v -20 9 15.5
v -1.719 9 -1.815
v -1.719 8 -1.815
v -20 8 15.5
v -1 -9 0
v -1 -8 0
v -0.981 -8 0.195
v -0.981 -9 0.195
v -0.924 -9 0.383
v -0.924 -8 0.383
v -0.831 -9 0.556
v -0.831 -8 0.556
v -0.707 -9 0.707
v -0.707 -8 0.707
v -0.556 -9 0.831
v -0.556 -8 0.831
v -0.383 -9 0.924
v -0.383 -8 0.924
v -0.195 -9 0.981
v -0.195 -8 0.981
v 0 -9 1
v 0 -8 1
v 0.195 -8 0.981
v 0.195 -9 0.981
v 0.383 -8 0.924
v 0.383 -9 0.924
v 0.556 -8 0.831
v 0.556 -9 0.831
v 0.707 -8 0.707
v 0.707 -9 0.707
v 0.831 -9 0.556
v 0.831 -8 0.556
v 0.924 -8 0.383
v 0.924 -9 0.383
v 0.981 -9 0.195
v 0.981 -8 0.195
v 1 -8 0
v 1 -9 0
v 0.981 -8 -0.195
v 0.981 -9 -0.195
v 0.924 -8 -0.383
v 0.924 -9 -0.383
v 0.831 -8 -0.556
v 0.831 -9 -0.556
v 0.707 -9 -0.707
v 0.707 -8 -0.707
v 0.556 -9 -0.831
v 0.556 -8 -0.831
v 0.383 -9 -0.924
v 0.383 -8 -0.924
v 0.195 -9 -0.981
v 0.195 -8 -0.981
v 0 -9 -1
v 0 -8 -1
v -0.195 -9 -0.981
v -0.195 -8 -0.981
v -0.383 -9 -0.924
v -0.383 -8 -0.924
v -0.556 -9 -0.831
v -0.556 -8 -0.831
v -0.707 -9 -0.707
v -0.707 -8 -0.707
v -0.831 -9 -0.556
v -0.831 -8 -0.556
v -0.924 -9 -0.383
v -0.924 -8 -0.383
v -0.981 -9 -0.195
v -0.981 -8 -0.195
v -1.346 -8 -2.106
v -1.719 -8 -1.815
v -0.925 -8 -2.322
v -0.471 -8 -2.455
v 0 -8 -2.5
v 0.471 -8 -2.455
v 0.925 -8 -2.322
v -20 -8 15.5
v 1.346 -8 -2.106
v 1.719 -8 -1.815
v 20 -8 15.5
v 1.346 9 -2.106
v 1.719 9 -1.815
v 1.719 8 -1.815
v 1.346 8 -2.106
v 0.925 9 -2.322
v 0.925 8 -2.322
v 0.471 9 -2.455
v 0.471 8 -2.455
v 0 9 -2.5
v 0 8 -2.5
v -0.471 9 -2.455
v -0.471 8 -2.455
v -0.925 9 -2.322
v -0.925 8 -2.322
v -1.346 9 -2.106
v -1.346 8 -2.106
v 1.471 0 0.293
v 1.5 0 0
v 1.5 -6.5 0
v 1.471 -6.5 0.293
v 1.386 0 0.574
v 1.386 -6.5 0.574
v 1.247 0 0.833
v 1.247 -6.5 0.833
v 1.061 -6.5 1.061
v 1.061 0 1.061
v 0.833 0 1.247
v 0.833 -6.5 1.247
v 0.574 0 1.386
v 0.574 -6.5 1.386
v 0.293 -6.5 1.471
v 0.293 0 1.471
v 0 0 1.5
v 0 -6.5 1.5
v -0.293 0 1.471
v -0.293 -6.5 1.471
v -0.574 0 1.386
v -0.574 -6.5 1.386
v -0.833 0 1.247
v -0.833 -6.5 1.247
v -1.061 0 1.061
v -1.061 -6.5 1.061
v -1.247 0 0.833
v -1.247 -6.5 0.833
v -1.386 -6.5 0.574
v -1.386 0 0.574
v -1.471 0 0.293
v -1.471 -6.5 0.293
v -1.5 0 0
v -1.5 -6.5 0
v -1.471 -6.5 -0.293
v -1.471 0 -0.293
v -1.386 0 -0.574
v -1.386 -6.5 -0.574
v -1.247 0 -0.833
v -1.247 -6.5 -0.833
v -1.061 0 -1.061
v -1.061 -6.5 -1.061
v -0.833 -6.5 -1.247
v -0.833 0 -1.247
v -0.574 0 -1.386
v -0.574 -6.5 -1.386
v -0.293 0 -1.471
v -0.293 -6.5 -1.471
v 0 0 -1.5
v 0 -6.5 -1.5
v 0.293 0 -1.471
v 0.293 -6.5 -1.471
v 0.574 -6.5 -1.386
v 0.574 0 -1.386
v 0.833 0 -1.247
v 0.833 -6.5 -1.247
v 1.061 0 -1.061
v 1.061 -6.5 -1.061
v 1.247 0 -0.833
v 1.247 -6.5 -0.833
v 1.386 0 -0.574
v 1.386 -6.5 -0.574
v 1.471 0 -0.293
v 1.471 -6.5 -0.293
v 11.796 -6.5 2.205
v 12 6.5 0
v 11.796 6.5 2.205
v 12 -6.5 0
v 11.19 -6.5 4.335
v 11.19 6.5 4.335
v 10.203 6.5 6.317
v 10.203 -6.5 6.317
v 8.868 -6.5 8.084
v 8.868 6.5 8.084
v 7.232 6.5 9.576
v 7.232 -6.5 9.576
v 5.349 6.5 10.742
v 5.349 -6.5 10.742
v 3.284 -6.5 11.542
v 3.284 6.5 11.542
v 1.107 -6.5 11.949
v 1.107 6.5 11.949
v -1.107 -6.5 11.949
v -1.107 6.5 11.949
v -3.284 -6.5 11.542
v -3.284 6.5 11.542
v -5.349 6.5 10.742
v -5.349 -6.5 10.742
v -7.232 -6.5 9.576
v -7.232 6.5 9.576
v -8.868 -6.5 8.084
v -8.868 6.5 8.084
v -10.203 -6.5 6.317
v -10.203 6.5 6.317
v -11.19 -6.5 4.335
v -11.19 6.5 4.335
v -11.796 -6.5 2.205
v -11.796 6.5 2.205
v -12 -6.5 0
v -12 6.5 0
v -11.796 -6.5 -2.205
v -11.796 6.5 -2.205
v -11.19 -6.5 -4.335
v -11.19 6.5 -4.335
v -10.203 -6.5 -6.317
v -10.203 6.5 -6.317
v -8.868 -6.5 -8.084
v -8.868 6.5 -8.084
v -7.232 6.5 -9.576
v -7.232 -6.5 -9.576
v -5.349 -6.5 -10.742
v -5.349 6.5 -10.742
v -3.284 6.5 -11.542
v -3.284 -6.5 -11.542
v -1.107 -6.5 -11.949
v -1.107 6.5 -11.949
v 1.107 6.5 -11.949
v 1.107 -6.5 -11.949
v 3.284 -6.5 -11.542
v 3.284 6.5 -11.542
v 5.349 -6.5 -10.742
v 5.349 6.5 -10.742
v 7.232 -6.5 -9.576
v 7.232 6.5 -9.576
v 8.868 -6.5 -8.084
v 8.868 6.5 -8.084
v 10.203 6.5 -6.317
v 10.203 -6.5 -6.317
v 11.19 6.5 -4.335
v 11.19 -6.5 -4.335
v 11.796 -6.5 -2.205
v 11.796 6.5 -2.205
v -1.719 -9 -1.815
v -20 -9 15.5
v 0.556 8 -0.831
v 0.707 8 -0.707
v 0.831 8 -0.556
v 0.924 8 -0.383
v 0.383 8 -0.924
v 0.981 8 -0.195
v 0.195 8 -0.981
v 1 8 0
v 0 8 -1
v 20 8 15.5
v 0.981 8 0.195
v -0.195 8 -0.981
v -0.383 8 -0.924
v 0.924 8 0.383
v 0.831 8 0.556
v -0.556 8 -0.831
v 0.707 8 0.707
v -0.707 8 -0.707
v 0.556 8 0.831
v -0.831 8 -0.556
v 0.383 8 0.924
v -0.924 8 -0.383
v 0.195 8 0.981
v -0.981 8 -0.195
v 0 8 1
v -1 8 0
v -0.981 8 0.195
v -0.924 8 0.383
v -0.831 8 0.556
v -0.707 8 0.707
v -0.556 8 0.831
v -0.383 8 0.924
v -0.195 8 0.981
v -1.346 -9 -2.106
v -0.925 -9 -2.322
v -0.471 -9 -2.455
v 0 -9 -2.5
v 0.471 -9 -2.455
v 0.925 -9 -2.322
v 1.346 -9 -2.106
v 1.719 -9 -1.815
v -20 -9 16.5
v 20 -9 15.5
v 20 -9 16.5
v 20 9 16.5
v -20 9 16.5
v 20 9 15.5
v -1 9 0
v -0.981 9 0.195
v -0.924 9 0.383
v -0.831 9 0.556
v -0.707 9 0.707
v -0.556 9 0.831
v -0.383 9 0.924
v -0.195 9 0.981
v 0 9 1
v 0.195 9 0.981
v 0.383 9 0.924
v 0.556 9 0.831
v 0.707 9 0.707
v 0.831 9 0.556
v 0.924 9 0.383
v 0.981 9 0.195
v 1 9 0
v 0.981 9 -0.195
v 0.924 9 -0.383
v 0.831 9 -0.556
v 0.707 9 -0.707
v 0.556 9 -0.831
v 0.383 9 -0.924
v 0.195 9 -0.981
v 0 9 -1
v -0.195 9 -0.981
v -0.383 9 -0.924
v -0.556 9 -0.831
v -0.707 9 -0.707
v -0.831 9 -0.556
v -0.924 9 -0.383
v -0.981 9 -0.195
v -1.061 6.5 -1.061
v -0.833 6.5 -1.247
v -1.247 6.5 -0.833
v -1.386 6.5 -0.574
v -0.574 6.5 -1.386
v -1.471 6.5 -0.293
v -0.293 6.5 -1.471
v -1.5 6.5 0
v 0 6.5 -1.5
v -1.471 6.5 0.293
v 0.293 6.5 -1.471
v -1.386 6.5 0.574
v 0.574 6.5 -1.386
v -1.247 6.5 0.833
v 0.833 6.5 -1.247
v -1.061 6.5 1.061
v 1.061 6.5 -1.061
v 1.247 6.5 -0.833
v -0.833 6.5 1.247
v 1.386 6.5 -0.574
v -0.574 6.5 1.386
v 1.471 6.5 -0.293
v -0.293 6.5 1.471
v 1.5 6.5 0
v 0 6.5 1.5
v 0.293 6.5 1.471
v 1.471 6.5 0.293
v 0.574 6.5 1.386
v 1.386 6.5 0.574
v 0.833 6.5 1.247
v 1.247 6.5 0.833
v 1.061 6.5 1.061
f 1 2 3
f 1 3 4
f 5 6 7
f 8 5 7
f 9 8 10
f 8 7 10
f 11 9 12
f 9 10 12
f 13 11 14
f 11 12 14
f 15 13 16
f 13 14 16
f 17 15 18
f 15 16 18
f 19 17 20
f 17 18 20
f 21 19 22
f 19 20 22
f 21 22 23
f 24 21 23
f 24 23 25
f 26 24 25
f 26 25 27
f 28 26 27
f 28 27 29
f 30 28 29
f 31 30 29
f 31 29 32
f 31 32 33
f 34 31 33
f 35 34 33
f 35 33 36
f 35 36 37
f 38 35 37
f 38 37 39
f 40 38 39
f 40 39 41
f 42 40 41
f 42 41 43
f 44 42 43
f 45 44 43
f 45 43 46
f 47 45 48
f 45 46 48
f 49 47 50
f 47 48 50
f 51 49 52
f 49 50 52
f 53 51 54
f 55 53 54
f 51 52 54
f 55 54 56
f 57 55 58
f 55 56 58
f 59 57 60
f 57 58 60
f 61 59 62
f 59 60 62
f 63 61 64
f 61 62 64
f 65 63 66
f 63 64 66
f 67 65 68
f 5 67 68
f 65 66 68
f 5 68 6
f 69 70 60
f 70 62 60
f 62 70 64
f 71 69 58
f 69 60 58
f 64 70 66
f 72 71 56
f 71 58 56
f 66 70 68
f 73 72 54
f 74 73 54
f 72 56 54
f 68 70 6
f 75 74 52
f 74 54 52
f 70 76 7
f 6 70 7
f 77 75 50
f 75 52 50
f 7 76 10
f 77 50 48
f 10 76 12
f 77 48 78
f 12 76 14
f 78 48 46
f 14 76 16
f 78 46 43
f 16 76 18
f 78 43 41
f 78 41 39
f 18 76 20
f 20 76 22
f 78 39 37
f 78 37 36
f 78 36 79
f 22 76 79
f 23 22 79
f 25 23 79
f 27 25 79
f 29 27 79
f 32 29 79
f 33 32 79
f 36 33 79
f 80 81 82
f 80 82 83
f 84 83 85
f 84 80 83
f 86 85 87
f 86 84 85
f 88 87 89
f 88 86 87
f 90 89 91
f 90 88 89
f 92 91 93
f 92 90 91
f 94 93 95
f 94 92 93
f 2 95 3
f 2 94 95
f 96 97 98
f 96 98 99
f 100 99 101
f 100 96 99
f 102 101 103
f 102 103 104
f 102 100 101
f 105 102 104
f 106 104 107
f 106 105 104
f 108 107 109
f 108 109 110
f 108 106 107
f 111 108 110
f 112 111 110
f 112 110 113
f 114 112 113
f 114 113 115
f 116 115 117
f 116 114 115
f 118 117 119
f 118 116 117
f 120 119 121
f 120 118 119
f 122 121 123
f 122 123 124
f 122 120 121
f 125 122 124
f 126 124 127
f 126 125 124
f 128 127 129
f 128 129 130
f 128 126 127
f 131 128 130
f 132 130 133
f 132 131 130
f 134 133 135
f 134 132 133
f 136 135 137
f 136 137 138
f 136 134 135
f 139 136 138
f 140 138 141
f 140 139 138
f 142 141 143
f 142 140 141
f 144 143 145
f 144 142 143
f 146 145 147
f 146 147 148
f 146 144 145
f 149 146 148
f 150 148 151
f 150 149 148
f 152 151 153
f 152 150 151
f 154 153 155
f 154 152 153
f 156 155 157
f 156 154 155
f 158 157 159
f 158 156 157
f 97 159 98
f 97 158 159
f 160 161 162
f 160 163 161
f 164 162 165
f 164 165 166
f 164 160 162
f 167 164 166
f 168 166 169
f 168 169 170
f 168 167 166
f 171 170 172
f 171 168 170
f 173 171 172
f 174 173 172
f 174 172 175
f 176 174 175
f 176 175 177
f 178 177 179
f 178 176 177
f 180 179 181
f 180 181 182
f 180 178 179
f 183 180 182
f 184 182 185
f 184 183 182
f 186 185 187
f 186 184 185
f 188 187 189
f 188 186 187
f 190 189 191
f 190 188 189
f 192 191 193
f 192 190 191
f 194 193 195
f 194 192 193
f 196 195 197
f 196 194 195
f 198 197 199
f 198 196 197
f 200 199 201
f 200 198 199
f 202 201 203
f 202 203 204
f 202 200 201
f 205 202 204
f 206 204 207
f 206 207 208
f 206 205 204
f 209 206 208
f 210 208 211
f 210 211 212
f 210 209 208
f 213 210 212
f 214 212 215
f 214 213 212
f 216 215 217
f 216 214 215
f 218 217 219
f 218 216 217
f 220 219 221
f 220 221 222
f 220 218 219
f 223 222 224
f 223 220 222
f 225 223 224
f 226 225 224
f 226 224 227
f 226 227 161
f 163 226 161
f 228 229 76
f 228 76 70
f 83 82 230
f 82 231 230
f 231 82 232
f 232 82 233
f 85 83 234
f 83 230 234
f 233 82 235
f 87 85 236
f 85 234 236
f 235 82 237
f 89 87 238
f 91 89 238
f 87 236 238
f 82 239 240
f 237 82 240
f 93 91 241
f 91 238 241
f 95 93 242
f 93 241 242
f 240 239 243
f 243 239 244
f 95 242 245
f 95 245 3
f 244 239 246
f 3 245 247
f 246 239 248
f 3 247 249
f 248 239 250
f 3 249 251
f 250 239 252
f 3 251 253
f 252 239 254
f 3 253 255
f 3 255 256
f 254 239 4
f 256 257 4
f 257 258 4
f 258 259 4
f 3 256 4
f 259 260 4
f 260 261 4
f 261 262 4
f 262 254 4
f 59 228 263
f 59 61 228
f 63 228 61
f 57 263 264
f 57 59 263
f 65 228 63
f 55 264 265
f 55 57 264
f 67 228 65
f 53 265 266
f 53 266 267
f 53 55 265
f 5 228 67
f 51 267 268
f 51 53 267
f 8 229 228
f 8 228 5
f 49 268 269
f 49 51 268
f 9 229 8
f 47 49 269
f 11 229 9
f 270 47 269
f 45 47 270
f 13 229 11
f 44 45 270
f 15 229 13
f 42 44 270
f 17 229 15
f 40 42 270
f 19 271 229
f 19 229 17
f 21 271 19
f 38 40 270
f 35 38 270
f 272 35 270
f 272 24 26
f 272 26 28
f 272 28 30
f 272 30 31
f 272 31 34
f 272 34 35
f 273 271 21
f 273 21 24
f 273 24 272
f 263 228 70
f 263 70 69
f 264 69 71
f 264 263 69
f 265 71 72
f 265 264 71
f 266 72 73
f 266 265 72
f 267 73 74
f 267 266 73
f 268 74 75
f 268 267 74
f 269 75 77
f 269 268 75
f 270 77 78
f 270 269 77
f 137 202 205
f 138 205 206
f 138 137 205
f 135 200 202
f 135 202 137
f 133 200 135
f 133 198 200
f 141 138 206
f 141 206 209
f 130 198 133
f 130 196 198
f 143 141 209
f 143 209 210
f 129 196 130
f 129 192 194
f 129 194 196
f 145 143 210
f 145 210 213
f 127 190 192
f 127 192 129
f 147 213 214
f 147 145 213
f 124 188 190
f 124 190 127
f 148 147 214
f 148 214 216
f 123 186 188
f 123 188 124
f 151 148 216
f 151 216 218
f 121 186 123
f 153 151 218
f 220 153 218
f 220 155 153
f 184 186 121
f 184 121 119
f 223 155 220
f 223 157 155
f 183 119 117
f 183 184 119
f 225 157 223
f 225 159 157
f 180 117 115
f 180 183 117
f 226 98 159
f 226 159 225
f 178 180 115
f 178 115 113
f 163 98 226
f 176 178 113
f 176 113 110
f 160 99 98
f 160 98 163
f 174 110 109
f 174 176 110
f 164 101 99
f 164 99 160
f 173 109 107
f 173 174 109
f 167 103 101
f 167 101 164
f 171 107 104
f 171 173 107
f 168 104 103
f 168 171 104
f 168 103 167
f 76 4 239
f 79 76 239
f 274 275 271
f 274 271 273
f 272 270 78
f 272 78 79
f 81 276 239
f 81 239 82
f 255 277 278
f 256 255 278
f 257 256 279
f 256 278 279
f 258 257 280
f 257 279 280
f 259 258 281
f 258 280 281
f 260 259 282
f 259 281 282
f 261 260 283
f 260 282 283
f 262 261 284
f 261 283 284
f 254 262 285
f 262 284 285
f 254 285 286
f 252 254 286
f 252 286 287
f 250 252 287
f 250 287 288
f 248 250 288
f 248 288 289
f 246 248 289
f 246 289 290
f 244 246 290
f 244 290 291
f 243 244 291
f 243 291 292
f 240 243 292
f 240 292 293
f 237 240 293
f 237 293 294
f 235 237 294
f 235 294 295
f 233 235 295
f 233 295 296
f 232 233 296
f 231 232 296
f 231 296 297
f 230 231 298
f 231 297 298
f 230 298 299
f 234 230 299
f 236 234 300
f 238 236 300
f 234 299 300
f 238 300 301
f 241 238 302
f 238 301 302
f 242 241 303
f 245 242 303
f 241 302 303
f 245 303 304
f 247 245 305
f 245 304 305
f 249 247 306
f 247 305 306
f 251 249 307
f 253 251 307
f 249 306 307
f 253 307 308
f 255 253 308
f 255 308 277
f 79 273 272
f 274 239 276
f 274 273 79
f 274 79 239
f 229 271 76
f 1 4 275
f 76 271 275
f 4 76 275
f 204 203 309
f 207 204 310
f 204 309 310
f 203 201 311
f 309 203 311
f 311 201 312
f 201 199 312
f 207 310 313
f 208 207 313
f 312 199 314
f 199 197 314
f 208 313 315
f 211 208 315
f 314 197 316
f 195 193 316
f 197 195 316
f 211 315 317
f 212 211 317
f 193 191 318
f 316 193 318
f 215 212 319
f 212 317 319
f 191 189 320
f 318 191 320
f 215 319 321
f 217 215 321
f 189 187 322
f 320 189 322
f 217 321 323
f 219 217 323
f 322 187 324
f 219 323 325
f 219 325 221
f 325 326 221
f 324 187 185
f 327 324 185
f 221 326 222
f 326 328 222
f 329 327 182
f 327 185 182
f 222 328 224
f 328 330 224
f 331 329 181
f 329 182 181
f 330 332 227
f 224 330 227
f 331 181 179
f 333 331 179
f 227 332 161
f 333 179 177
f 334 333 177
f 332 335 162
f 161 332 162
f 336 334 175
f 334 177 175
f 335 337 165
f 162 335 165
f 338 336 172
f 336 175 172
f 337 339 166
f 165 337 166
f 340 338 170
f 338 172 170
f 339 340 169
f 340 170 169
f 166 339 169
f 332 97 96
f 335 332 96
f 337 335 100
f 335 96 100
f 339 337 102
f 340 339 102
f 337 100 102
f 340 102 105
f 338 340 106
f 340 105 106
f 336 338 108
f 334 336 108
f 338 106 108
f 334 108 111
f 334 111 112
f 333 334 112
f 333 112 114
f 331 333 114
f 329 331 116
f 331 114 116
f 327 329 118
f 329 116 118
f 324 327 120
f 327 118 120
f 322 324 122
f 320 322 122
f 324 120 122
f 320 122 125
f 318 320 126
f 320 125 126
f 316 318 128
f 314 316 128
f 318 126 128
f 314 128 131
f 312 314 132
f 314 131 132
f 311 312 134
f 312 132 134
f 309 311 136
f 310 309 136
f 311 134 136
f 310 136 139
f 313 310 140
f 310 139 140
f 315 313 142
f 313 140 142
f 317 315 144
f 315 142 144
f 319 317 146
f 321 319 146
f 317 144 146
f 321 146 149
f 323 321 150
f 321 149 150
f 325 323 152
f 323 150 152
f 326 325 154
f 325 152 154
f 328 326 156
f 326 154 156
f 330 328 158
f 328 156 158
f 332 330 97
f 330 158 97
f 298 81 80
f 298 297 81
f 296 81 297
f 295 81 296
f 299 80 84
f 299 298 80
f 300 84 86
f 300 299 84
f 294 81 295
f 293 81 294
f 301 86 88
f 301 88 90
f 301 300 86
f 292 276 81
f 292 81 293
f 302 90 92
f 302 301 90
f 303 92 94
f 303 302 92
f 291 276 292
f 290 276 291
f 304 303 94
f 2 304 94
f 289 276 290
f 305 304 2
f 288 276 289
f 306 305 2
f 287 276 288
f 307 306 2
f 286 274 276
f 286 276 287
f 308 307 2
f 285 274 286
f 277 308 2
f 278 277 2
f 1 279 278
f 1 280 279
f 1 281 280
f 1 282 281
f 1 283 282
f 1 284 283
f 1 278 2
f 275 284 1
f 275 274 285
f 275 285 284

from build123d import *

# Parameters (mm, degrees)
F0_R          = 12
F0_R_2        = 1.5
F1_DEPTH      = 6.5
F1_DEPTH_BACK = 6.5
F3_W          = 40
F3_H          = 18
F4_DEPTH      = 1
F6_DEPTH      = 1
F8_DEPTH      = 1
F9_R          = 1
F10_DEPTH     = 18.001


with BuildPart() as f1:
    # F0 (on Front) → F1 (new body, two sides)
    with BuildSketch(Plane.XZ) as f1_sk:
        Circle(F0_R)
        Circle(F0_R_2, mode=Mode.SUBTRACT)
    extrude(amount=F1_DEPTH)
    extrude(f1_sk.sketch, amount=-F1_DEPTH_BACK)


with BuildPart() as f4:
    # F3 (on offset) → F4 (new body)
    with BuildSketch(Plane.XY.offset(16.5)):
        Rectangle(F3_W, F3_H)
    extrude(amount=-F4_DEPTH)

    # F5 (on face) → F6 (join)
    with BuildSketch(Plane.XZ.offset(9)):
        with BuildLine():
            ThreePointArc((-1.719172, -1.815061), (-0.987945, 2.296512), (2.5, 0))
            ThreePointArc((2.5, 0), (2.296512, -0.987945), (1.719172, -1.815061))
            Line((1.719172, -1.815061), (20, 15.5))
            Line((20, 15.5), (-20, 15.5))
            Line((-20, 15.5), (-1.719172, -1.815061))
        make_face()
        with BuildLine():
            ThreePointArc((1.719172, -1.815061), (2.296512, -0.987945), (2.5, 0))
            ThreePointArc((2.5, 0), (-0.987945, 2.296512), (-1.719172, -1.815061))
            ThreePointArc((-1.719172, -1.815061), (0, -2.5), (1.719172, -1.815061))
        make_face()
    extrude(amount=-F6_DEPTH)

    # F7 (on face) → F8 (join)
    with BuildSketch(Plane(origin=(0, 9, 0), x_dir=(-1, 0, 0), z_dir=(0, 1, 0))):
        with BuildLine():
            ThreePointArc((-1.719172, -1.815061), (0, -2.5), (1.719172, -1.815061))
            Line((1.719172, -1.815061), (20, 15.5))
            Line((20, 15.5), (-20, 15.5))
            Line((-20, 15.5), (-1.719172, -1.815061))
        make_face()
    extrude(amount=-F8_DEPTH)

    # F9 (on face) → F10 (cut, through all)
    with BuildSketch(Plane(origin=(0, 9, 0), x_dir=(-1, 0, 0), z_dir=(0, 1, 0))):
        Circle(F9_R)
    extrude(amount=-F10_DEPTH, mode=Mode.SUBTRACT)


solid = Compound([f1.part, f4.part])
